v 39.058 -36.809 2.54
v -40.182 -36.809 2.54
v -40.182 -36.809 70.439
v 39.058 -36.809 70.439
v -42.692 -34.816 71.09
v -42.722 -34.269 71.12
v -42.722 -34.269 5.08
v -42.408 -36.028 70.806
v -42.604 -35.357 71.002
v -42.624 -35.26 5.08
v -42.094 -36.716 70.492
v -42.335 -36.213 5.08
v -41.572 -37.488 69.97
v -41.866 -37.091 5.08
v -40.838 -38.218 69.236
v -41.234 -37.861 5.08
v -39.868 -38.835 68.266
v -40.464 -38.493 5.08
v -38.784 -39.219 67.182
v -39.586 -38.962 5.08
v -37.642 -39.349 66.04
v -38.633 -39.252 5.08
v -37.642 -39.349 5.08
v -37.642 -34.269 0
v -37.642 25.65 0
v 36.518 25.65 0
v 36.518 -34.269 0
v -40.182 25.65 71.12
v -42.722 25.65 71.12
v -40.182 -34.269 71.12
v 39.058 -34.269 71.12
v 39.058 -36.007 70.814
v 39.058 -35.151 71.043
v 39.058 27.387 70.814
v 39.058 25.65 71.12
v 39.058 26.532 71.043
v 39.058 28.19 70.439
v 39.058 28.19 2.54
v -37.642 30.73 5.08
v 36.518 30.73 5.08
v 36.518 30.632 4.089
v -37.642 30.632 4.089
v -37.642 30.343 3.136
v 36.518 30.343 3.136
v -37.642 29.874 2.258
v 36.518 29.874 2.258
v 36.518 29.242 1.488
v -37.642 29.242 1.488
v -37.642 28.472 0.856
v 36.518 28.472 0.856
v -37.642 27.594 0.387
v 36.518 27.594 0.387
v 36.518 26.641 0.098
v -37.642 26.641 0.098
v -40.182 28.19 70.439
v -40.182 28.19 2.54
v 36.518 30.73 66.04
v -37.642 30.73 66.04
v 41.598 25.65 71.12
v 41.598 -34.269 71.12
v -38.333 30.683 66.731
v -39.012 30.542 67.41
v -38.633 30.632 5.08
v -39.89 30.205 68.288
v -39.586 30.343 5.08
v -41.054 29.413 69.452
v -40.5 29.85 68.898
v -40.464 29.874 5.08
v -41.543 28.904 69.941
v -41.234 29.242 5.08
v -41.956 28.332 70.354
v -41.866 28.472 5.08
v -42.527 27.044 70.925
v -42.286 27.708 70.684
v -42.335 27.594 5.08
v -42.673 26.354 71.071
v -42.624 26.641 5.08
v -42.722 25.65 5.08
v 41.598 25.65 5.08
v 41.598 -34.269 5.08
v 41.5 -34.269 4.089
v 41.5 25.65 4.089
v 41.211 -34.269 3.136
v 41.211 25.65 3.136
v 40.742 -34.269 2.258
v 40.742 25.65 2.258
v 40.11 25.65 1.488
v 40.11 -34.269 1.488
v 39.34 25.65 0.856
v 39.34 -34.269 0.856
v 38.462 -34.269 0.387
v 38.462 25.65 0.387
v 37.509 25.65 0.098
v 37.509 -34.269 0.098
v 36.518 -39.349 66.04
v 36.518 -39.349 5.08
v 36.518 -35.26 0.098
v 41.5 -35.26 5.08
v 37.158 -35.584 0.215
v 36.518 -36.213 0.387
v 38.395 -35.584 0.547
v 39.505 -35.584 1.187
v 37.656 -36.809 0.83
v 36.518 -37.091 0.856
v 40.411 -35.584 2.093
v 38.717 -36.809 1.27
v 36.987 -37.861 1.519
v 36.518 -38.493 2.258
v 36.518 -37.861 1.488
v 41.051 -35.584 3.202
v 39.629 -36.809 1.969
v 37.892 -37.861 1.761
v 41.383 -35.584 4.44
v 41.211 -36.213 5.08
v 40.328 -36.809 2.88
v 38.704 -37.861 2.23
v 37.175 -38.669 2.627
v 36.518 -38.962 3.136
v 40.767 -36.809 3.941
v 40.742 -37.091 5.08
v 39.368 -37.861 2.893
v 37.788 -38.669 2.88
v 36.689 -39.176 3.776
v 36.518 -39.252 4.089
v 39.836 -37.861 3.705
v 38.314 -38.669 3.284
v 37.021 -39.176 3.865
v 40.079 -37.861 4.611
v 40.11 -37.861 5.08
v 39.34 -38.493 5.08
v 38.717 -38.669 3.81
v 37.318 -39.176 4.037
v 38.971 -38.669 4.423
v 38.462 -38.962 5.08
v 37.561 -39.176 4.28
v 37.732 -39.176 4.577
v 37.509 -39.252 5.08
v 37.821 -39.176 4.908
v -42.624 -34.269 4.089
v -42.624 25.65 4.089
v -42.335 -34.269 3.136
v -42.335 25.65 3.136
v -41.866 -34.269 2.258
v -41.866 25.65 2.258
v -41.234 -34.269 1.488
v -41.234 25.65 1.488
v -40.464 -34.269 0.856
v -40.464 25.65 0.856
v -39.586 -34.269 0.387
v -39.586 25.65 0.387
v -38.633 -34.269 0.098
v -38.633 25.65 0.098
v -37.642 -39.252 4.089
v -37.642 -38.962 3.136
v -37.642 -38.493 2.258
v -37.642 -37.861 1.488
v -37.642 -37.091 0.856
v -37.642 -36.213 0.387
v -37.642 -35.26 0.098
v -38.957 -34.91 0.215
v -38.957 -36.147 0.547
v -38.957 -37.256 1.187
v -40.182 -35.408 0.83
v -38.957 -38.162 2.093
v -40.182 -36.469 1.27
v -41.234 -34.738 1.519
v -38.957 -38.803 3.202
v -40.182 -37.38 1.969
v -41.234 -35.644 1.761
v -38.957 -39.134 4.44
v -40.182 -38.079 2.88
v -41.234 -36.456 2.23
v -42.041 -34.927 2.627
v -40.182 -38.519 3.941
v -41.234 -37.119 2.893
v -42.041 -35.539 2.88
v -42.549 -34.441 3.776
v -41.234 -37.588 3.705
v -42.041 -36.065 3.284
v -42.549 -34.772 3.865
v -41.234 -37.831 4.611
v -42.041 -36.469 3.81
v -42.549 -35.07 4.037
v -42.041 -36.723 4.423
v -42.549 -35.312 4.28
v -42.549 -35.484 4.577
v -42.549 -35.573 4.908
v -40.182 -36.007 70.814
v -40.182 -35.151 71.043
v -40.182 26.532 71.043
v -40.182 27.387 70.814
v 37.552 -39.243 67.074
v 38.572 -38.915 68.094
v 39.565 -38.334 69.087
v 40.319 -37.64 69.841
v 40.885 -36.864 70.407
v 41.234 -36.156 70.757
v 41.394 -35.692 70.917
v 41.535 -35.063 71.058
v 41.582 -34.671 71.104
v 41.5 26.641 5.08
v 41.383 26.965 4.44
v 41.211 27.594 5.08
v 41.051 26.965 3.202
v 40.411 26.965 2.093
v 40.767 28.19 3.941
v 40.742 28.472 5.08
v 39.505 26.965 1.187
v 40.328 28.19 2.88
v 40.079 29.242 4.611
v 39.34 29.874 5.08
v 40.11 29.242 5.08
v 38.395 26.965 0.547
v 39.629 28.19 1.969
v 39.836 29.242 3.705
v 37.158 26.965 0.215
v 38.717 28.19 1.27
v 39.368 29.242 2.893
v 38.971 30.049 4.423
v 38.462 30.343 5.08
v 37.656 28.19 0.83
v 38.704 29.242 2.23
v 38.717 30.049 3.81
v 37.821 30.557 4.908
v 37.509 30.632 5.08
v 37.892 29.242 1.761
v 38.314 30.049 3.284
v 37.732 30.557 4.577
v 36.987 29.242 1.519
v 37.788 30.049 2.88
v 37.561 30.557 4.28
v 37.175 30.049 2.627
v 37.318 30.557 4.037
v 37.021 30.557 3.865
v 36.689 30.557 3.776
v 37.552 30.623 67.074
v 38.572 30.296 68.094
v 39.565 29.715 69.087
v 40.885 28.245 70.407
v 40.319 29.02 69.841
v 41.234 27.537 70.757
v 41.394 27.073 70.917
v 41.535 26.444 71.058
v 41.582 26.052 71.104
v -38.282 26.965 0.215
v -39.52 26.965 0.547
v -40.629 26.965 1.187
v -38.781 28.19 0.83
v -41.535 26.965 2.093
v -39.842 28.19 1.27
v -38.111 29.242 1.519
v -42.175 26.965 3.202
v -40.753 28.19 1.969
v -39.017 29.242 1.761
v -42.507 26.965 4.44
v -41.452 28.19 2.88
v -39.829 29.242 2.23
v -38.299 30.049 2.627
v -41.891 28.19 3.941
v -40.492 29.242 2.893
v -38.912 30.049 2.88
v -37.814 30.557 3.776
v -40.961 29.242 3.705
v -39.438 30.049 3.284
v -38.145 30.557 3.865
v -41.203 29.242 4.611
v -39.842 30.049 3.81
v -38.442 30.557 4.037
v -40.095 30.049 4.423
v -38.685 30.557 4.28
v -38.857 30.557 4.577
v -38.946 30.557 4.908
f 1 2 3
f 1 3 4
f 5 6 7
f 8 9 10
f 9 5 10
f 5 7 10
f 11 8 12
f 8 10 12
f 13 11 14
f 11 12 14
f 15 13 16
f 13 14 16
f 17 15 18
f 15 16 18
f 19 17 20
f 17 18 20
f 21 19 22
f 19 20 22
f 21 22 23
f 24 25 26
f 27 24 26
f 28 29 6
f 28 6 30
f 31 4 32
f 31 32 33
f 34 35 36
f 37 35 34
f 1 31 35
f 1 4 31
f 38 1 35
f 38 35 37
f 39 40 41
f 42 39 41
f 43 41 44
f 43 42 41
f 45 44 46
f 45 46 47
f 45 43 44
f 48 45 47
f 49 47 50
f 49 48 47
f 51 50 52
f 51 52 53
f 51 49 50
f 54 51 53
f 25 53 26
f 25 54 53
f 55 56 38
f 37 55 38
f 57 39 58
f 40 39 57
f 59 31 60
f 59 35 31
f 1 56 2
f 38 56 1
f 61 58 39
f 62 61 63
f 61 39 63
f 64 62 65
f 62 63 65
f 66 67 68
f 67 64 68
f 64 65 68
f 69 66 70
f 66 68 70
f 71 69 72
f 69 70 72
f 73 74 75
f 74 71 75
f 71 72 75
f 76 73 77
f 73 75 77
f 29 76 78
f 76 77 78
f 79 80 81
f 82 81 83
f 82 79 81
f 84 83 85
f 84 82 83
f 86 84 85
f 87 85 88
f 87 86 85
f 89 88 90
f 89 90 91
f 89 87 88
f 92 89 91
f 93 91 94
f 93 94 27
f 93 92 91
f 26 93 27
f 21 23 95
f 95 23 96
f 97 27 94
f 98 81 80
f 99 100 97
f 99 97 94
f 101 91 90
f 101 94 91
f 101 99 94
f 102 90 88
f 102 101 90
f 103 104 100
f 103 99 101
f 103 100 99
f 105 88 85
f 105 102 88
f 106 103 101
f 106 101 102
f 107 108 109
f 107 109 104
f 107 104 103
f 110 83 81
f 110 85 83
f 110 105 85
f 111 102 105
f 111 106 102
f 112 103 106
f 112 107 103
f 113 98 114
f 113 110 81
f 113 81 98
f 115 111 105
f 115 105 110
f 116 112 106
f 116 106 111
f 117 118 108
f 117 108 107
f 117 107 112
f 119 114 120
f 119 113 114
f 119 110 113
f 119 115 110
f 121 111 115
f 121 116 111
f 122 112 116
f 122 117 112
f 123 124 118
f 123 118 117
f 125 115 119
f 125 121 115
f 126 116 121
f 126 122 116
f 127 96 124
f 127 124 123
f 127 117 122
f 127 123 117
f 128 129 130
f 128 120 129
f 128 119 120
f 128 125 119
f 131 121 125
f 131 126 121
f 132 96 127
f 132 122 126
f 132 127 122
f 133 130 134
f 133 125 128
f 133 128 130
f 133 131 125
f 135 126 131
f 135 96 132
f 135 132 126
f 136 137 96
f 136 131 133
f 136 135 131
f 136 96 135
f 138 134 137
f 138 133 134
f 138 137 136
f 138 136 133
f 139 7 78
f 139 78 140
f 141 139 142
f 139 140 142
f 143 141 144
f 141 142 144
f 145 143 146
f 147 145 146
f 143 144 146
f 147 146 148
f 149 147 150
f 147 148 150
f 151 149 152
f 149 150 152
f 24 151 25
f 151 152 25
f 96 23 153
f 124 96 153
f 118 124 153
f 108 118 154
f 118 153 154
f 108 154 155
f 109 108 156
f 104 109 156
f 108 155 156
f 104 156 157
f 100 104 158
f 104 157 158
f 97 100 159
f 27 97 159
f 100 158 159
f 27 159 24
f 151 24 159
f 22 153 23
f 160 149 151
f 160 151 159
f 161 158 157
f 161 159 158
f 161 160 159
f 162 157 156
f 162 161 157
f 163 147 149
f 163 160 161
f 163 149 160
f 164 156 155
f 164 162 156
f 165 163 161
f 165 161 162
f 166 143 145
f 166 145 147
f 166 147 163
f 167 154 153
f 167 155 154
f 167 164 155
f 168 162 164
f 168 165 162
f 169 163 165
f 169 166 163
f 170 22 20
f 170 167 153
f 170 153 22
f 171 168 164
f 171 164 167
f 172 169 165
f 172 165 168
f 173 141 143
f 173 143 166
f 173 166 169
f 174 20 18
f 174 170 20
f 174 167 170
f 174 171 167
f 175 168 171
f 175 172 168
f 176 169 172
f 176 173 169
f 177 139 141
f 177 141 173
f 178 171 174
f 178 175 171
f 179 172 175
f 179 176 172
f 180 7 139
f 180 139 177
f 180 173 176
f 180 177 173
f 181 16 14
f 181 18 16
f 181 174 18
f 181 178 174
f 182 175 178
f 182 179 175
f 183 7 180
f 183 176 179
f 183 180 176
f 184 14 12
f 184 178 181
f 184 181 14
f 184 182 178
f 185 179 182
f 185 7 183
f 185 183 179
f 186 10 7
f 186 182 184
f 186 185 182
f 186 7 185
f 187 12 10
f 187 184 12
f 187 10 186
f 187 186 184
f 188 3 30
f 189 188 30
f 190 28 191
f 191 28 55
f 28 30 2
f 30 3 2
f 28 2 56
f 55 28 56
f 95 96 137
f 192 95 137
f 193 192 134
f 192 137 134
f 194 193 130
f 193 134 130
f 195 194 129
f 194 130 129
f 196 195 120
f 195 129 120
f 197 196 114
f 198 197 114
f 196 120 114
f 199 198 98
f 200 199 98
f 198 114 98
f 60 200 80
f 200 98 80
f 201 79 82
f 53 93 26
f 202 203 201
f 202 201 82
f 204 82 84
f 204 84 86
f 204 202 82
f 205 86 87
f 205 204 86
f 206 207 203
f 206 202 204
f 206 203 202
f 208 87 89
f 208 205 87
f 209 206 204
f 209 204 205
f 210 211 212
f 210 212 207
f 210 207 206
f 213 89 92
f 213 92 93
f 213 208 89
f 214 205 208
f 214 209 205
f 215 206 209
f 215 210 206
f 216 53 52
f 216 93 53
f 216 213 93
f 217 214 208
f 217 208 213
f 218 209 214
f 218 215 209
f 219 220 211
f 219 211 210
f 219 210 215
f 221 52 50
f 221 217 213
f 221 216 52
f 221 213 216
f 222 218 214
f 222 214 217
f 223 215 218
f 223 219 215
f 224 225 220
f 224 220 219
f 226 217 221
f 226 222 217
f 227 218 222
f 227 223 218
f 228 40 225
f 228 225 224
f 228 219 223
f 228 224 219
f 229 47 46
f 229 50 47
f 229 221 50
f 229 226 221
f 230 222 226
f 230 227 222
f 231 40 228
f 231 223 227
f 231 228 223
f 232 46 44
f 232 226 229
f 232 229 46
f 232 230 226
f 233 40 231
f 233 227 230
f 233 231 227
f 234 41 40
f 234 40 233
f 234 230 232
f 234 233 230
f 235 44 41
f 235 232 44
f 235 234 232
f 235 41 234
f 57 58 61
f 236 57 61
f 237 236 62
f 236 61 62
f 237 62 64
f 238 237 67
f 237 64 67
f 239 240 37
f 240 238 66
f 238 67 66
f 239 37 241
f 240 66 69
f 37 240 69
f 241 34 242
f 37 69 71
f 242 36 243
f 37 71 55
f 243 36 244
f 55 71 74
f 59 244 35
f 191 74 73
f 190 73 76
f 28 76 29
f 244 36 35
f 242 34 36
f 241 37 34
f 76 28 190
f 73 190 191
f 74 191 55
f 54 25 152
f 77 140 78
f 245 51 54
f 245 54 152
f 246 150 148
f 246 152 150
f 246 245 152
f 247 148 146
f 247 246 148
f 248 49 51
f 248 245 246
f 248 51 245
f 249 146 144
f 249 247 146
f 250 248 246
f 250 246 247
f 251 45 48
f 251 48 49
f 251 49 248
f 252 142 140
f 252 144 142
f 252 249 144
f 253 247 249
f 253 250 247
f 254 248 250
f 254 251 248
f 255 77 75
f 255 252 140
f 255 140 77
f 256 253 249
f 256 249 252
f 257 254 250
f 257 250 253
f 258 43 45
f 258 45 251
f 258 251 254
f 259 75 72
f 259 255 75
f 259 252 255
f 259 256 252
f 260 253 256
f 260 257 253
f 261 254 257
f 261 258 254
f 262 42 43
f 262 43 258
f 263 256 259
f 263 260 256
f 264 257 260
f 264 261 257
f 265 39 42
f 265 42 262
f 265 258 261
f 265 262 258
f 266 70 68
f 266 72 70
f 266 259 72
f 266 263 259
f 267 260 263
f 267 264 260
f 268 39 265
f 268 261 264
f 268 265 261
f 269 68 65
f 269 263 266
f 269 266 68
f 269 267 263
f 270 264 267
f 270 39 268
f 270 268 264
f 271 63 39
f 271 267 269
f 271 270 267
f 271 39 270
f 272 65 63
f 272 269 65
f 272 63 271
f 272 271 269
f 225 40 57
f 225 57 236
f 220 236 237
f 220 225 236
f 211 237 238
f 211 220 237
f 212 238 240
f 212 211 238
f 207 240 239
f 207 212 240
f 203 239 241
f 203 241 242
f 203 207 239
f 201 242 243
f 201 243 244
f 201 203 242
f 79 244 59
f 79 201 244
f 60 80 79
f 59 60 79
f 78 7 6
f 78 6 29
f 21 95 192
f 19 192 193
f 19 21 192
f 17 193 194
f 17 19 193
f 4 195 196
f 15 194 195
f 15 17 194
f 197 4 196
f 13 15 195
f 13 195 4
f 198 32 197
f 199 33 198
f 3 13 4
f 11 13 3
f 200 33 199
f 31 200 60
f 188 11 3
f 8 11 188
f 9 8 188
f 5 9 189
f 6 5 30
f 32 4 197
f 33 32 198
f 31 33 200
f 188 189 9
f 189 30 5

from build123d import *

# Parameters (mm, degrees)
F0_W         = 84.3196734786
F0_H         = 70.0790211558
F1_DEPTH     = 71.12
F2_T         = -2.54
F3_T1_DEPTH  = 78.74
F3_T3_DEPTH  = 109.7196734786
F3_T5_DEPTH  = 74.1596734786
F3_T7_DEPTH  = 59.9190211558
F3_S11_W     = 5.08
F3_S11_H     = 5.08
F3_T12_DEPTH = 5.08
F3_S17_W     = 5.08
F3_S17_H     = 5.08
F3_T18_DEPTH = 5.08
F3_S23_W     = 5.08
F3_S23_H     = 5.08
F3_T24_DEPTH = 5.08
F3_S29_W     = 5.08
F3_S29_H     = 5.08
F3_T30_DEPTH = 5.08


# Not quite as in the source:
# - a fillet or chamfer that OpenCascade refuses, or shapes differently, is made with other operations: its cross-section is extruded or revolved along the edge and cut away or added


with BuildPart() as f1:
    # F0 (on Top) → F1 (new body)
    with BuildSketch(Plane.XY):
        with Locations((-0.5621314049, -4.3096728623)):
            Rectangle(F0_W, F0_H)
    extrude(amount=F1_DEPTH)

    # F2
    f2_openings = [f1.faces().sort_by_distance(p)[0] for p in [
        (-0.562131, -4.309673, 71.12),
    ]]
    offset(amount=F2_T, openings=f2_openings)

    # F3: fillet of radius 5.08 on 10 edges, made by hand

    # F3_s2 → F3_t1 (cut)
    with BuildSketch(Plane.XY.offset(5.08)):
        with BuildLine():
            ThreePointArc((36.5177053344, -39.3491834402), (40.1098077829, -37.8612858886), (41.5977053344, -34.2691834402))
            Line((41.5977053344, -34.2691834402), (41.5977053344, -39.3491834402))
            Line((41.5977053344, -39.3491834402), (36.5177053344, -39.3491834402))
        make_face()
        with BuildLine():
            ThreePointArc((-42.7219681442, -34.2691834402), (-41.2340705926, -37.8612858886), (-37.6419681442, -39.3491834402))
            Line((-37.6419681442, -39.3491834402), (-42.7219681442, -39.3491834402))
            Line((-42.7219681442, -39.3491834402), (-42.7219681442, -34.2691834402))
        make_face()
        with BuildLine():
            ThreePointArc((36.5177053344, 30.7298377156), (40.1098077829, 29.2419401641), (41.5977053344, 25.6498377156))
            Line((41.5977053344, 25.6498377156), (41.5977053344, 30.7298377156))
            Line((41.5977053344, 30.7298377156), (36.5177053344, 30.7298377156))
        make_face()
        with BuildLine():
            ThreePointArc((-37.6419681442, 30.7298377156), (-41.2340705926, 29.2419401641), (-42.7219681442, 25.6498377156))
            Line((-42.7219681442, 25.6498377156), (-42.7219681442, 30.7298377156))
            Line((-42.7219681442, 30.7298377156), (-37.6419681442, 30.7298377156))
        make_face()
    extrude(amount=F3_T1_DEPTH, mode=Mode.SUBTRACT)

    # F3_s4 → F3_t3 (cut)
    with BuildSketch(Plane.YZ.offset(-55.4219681442)):
        with BuildLine():
            ThreePointArc((30.7298377156, 66.04), (29.2419401641, 69.6321024484), (25.6498377156, 71.12))
            Line((25.6498377156, 71.12), (30.7298377156, 71.12))
            Line((30.7298377156, 71.12), (30.7298377156, 66.04))
        make_face()
        with BuildLine():
            ThreePointArc((-39.3491834402, 66.04), (-37.8612858886, 69.6321024484), (-34.2691834402, 71.12))
            Line((-34.2691834402, 71.12), (-39.3491834402, 71.12))
            Line((-39.3491834402, 71.12), (-39.3491834402, 66.04))
        make_face()
    extrude(amount=F3_T3_DEPTH, mode=Mode.SUBTRACT)

    # F3_s6 → F3_t5 (cut)
    with BuildSketch(Plane.YZ.offset(-37.6419681442)):
        with BuildLine():
            ThreePointArc((30.7298377156, 5.08), (29.2419401641, 1.4878975516), (25.6498377156, 0))
            Line((25.6498377156, 0), (30.7298377156, 0))
            Line((30.7298377156, 0), (30.7298377156, 5.08))
        make_face()
        with BuildLine():
            ThreePointArc((-39.3491834402, 5.08), (-37.8612858886, 1.4878975516), (-34.2691834402, 0))
            Line((-34.2691834402, 0), (-39.3491834402, 0))
            Line((-39.3491834402, 0), (-39.3491834402, 5.08))
        make_face()
    extrude(amount=F3_T5_DEPTH, mode=Mode.SUBTRACT)

    # F3_s8 → F3_t7 (cut)
    with BuildSketch(Plane.XZ.offset(-25.6498377156)):
        with BuildLine():
            ThreePointArc((41.5977053344, 5.08), (40.1098077829, 1.4878975516), (36.5177053344, 0))
            Line((36.5177053344, 0), (41.5977053344, 0))
            Line((41.5977053344, 0), (41.5977053344, 5.08))
        make_face()
        with BuildLine():
            ThreePointArc((-42.7219681442, 5.08), (-41.2340705926, 1.4878975516), (-37.6419681442, 0))
            Line((-37.6419681442, 0), (-42.7219681442, 0))
            Line((-42.7219681442, 0), (-42.7219681442, 5.08))
        make_face()
    extrude(amount=F3_T7_DEPTH, mode=Mode.SUBTRACT)


with BuildPart() as f3_tool10:
    # F3_s11 → F3_t12 (new body)
    with BuildSketch(Plane.XZ.offset(34.2691834402)):
        with Locations((39.0577053344, 2.54)):
            Rectangle(F3_S11_W, F3_S11_H)
    extrude(amount=F3_T12_DEPTH)

    # F3_s13 → F3_t14 (revolve, cut)
    with BuildSketch(Plane(origin=(36.5177053344, -34.2691834402, 5.08), x_dir=(-0.7071067812, 0, 0.7071067812), z_dir=(0.7071067812, 0, 0.7071067812))):
        with BuildLine():
            ThreePointArc((0, -5.08), (5.08, 0), (0, 5.08))
            Line((0, 5.08), (0, -5.08))
        make_face()
    revolve(axis=Axis((36.5177053344, -34.2691834402, 5.08), (0, -1, 0)), mode=Mode.SUBTRACT)


with BuildPart() as f1_1:
    add(f1.part)

    # F3_t9: cut F3_tool10
    add(f3_tool10.part, mode=Mode.SUBTRACT)


with BuildPart() as f3_tool16:
    # F3_s17 → F3_t18 (new body)
    with BuildSketch(Plane.YZ.offset(-37.6419681442)):
        with Locations((-36.8091834402, 2.54)):
            Rectangle(F3_S17_W, F3_S17_H)
    extrude(amount=-F3_T18_DEPTH)

    # F3_s19 → F3_t20 (revolve, cut)
    with BuildSketch(Plane(origin=(-37.6419681442, -34.2691834402, 5.08), x_dir=(0, 0.7071067812, 0.7071067812), z_dir=(0, -0.7071067812, 0.7071067812))):
        with BuildLine():
            ThreePointArc((0, -5.08), (5.08, 0), (0, 5.08))
            Line((0, 5.08), (0, -5.08))
        make_face()
    revolve(axis=Axis((-37.6419681442, -34.2691834402, 5.08), (-1, 0, 0)), mode=Mode.SUBTRACT)


with BuildPart() as f1_2:
    add(f1_1.part)

    # F3_t15: cut F3_tool16
    add(f3_tool16.part, mode=Mode.SUBTRACT)


with BuildPart() as f3_tool22:
    # F3_s23 → F3_t24 (new body)
    with BuildSketch(Plane.XZ.offset(-25.6498377156)):
        with Locations((39.0577053344, 2.54)):
            Rectangle(F3_S23_W, F3_S23_H)
    extrude(amount=-F3_T24_DEPTH)

    # F3_s25 → F3_t26 (revolve, cut)
    with BuildSketch(Plane(origin=(36.5177053344, 25.6498377156, 5.08), x_dir=(-0.7071067812, 0, 0.7071067812), z_dir=(-0.7071067812, 0, -0.7071067812))):
        with BuildLine():
            ThreePointArc((0, -5.08), (5.08, 0), (0, 5.08))
            Line((0, 5.08), (0, -5.08))
        make_face()
    revolve(axis=Axis((36.5177053344, 25.6498377156, 5.08), (0, 1, 0)), mode=Mode.SUBTRACT)


with BuildPart() as f1_3:
    add(f1_2.part)

    # F3_t21: cut F3_tool22
    add(f3_tool22.part, mode=Mode.SUBTRACT)


with BuildPart() as f3_tool28:
    # F3_s29 → F3_t30 (new body)
    with BuildSketch(Plane.XZ.offset(-25.6498377156)):
        with Locations((-40.1819681442, 2.54)):
            Rectangle(F3_S29_W, F3_S29_H)
    extrude(amount=-F3_T30_DEPTH)

    # F3_s31 → F3_t32 (revolve, cut)
    with BuildSketch(Plane(origin=(-37.6419681442, 25.6498377156, 5.08), x_dir=(0.7071067812, 0, 0.7071067812), z_dir=(-0.7071067812, 0, 0.7071067812))):
        with BuildLine():
            ThreePointArc((0, -5.08), (5.08, 0), (0, 5.08))
            Line((0, 5.08), (0, -5.08))
        make_face()
    revolve(axis=Axis((-37.6419681442, 25.6498377156, 5.08), (0, 1, 0)), mode=Mode.SUBTRACT)


with BuildPart() as f1_4:
    add(f1_3.part)

    # F3_t27: cut F3_tool28
    add(f3_tool28.part, mode=Mode.SUBTRACT)


solid = f1_4.part
